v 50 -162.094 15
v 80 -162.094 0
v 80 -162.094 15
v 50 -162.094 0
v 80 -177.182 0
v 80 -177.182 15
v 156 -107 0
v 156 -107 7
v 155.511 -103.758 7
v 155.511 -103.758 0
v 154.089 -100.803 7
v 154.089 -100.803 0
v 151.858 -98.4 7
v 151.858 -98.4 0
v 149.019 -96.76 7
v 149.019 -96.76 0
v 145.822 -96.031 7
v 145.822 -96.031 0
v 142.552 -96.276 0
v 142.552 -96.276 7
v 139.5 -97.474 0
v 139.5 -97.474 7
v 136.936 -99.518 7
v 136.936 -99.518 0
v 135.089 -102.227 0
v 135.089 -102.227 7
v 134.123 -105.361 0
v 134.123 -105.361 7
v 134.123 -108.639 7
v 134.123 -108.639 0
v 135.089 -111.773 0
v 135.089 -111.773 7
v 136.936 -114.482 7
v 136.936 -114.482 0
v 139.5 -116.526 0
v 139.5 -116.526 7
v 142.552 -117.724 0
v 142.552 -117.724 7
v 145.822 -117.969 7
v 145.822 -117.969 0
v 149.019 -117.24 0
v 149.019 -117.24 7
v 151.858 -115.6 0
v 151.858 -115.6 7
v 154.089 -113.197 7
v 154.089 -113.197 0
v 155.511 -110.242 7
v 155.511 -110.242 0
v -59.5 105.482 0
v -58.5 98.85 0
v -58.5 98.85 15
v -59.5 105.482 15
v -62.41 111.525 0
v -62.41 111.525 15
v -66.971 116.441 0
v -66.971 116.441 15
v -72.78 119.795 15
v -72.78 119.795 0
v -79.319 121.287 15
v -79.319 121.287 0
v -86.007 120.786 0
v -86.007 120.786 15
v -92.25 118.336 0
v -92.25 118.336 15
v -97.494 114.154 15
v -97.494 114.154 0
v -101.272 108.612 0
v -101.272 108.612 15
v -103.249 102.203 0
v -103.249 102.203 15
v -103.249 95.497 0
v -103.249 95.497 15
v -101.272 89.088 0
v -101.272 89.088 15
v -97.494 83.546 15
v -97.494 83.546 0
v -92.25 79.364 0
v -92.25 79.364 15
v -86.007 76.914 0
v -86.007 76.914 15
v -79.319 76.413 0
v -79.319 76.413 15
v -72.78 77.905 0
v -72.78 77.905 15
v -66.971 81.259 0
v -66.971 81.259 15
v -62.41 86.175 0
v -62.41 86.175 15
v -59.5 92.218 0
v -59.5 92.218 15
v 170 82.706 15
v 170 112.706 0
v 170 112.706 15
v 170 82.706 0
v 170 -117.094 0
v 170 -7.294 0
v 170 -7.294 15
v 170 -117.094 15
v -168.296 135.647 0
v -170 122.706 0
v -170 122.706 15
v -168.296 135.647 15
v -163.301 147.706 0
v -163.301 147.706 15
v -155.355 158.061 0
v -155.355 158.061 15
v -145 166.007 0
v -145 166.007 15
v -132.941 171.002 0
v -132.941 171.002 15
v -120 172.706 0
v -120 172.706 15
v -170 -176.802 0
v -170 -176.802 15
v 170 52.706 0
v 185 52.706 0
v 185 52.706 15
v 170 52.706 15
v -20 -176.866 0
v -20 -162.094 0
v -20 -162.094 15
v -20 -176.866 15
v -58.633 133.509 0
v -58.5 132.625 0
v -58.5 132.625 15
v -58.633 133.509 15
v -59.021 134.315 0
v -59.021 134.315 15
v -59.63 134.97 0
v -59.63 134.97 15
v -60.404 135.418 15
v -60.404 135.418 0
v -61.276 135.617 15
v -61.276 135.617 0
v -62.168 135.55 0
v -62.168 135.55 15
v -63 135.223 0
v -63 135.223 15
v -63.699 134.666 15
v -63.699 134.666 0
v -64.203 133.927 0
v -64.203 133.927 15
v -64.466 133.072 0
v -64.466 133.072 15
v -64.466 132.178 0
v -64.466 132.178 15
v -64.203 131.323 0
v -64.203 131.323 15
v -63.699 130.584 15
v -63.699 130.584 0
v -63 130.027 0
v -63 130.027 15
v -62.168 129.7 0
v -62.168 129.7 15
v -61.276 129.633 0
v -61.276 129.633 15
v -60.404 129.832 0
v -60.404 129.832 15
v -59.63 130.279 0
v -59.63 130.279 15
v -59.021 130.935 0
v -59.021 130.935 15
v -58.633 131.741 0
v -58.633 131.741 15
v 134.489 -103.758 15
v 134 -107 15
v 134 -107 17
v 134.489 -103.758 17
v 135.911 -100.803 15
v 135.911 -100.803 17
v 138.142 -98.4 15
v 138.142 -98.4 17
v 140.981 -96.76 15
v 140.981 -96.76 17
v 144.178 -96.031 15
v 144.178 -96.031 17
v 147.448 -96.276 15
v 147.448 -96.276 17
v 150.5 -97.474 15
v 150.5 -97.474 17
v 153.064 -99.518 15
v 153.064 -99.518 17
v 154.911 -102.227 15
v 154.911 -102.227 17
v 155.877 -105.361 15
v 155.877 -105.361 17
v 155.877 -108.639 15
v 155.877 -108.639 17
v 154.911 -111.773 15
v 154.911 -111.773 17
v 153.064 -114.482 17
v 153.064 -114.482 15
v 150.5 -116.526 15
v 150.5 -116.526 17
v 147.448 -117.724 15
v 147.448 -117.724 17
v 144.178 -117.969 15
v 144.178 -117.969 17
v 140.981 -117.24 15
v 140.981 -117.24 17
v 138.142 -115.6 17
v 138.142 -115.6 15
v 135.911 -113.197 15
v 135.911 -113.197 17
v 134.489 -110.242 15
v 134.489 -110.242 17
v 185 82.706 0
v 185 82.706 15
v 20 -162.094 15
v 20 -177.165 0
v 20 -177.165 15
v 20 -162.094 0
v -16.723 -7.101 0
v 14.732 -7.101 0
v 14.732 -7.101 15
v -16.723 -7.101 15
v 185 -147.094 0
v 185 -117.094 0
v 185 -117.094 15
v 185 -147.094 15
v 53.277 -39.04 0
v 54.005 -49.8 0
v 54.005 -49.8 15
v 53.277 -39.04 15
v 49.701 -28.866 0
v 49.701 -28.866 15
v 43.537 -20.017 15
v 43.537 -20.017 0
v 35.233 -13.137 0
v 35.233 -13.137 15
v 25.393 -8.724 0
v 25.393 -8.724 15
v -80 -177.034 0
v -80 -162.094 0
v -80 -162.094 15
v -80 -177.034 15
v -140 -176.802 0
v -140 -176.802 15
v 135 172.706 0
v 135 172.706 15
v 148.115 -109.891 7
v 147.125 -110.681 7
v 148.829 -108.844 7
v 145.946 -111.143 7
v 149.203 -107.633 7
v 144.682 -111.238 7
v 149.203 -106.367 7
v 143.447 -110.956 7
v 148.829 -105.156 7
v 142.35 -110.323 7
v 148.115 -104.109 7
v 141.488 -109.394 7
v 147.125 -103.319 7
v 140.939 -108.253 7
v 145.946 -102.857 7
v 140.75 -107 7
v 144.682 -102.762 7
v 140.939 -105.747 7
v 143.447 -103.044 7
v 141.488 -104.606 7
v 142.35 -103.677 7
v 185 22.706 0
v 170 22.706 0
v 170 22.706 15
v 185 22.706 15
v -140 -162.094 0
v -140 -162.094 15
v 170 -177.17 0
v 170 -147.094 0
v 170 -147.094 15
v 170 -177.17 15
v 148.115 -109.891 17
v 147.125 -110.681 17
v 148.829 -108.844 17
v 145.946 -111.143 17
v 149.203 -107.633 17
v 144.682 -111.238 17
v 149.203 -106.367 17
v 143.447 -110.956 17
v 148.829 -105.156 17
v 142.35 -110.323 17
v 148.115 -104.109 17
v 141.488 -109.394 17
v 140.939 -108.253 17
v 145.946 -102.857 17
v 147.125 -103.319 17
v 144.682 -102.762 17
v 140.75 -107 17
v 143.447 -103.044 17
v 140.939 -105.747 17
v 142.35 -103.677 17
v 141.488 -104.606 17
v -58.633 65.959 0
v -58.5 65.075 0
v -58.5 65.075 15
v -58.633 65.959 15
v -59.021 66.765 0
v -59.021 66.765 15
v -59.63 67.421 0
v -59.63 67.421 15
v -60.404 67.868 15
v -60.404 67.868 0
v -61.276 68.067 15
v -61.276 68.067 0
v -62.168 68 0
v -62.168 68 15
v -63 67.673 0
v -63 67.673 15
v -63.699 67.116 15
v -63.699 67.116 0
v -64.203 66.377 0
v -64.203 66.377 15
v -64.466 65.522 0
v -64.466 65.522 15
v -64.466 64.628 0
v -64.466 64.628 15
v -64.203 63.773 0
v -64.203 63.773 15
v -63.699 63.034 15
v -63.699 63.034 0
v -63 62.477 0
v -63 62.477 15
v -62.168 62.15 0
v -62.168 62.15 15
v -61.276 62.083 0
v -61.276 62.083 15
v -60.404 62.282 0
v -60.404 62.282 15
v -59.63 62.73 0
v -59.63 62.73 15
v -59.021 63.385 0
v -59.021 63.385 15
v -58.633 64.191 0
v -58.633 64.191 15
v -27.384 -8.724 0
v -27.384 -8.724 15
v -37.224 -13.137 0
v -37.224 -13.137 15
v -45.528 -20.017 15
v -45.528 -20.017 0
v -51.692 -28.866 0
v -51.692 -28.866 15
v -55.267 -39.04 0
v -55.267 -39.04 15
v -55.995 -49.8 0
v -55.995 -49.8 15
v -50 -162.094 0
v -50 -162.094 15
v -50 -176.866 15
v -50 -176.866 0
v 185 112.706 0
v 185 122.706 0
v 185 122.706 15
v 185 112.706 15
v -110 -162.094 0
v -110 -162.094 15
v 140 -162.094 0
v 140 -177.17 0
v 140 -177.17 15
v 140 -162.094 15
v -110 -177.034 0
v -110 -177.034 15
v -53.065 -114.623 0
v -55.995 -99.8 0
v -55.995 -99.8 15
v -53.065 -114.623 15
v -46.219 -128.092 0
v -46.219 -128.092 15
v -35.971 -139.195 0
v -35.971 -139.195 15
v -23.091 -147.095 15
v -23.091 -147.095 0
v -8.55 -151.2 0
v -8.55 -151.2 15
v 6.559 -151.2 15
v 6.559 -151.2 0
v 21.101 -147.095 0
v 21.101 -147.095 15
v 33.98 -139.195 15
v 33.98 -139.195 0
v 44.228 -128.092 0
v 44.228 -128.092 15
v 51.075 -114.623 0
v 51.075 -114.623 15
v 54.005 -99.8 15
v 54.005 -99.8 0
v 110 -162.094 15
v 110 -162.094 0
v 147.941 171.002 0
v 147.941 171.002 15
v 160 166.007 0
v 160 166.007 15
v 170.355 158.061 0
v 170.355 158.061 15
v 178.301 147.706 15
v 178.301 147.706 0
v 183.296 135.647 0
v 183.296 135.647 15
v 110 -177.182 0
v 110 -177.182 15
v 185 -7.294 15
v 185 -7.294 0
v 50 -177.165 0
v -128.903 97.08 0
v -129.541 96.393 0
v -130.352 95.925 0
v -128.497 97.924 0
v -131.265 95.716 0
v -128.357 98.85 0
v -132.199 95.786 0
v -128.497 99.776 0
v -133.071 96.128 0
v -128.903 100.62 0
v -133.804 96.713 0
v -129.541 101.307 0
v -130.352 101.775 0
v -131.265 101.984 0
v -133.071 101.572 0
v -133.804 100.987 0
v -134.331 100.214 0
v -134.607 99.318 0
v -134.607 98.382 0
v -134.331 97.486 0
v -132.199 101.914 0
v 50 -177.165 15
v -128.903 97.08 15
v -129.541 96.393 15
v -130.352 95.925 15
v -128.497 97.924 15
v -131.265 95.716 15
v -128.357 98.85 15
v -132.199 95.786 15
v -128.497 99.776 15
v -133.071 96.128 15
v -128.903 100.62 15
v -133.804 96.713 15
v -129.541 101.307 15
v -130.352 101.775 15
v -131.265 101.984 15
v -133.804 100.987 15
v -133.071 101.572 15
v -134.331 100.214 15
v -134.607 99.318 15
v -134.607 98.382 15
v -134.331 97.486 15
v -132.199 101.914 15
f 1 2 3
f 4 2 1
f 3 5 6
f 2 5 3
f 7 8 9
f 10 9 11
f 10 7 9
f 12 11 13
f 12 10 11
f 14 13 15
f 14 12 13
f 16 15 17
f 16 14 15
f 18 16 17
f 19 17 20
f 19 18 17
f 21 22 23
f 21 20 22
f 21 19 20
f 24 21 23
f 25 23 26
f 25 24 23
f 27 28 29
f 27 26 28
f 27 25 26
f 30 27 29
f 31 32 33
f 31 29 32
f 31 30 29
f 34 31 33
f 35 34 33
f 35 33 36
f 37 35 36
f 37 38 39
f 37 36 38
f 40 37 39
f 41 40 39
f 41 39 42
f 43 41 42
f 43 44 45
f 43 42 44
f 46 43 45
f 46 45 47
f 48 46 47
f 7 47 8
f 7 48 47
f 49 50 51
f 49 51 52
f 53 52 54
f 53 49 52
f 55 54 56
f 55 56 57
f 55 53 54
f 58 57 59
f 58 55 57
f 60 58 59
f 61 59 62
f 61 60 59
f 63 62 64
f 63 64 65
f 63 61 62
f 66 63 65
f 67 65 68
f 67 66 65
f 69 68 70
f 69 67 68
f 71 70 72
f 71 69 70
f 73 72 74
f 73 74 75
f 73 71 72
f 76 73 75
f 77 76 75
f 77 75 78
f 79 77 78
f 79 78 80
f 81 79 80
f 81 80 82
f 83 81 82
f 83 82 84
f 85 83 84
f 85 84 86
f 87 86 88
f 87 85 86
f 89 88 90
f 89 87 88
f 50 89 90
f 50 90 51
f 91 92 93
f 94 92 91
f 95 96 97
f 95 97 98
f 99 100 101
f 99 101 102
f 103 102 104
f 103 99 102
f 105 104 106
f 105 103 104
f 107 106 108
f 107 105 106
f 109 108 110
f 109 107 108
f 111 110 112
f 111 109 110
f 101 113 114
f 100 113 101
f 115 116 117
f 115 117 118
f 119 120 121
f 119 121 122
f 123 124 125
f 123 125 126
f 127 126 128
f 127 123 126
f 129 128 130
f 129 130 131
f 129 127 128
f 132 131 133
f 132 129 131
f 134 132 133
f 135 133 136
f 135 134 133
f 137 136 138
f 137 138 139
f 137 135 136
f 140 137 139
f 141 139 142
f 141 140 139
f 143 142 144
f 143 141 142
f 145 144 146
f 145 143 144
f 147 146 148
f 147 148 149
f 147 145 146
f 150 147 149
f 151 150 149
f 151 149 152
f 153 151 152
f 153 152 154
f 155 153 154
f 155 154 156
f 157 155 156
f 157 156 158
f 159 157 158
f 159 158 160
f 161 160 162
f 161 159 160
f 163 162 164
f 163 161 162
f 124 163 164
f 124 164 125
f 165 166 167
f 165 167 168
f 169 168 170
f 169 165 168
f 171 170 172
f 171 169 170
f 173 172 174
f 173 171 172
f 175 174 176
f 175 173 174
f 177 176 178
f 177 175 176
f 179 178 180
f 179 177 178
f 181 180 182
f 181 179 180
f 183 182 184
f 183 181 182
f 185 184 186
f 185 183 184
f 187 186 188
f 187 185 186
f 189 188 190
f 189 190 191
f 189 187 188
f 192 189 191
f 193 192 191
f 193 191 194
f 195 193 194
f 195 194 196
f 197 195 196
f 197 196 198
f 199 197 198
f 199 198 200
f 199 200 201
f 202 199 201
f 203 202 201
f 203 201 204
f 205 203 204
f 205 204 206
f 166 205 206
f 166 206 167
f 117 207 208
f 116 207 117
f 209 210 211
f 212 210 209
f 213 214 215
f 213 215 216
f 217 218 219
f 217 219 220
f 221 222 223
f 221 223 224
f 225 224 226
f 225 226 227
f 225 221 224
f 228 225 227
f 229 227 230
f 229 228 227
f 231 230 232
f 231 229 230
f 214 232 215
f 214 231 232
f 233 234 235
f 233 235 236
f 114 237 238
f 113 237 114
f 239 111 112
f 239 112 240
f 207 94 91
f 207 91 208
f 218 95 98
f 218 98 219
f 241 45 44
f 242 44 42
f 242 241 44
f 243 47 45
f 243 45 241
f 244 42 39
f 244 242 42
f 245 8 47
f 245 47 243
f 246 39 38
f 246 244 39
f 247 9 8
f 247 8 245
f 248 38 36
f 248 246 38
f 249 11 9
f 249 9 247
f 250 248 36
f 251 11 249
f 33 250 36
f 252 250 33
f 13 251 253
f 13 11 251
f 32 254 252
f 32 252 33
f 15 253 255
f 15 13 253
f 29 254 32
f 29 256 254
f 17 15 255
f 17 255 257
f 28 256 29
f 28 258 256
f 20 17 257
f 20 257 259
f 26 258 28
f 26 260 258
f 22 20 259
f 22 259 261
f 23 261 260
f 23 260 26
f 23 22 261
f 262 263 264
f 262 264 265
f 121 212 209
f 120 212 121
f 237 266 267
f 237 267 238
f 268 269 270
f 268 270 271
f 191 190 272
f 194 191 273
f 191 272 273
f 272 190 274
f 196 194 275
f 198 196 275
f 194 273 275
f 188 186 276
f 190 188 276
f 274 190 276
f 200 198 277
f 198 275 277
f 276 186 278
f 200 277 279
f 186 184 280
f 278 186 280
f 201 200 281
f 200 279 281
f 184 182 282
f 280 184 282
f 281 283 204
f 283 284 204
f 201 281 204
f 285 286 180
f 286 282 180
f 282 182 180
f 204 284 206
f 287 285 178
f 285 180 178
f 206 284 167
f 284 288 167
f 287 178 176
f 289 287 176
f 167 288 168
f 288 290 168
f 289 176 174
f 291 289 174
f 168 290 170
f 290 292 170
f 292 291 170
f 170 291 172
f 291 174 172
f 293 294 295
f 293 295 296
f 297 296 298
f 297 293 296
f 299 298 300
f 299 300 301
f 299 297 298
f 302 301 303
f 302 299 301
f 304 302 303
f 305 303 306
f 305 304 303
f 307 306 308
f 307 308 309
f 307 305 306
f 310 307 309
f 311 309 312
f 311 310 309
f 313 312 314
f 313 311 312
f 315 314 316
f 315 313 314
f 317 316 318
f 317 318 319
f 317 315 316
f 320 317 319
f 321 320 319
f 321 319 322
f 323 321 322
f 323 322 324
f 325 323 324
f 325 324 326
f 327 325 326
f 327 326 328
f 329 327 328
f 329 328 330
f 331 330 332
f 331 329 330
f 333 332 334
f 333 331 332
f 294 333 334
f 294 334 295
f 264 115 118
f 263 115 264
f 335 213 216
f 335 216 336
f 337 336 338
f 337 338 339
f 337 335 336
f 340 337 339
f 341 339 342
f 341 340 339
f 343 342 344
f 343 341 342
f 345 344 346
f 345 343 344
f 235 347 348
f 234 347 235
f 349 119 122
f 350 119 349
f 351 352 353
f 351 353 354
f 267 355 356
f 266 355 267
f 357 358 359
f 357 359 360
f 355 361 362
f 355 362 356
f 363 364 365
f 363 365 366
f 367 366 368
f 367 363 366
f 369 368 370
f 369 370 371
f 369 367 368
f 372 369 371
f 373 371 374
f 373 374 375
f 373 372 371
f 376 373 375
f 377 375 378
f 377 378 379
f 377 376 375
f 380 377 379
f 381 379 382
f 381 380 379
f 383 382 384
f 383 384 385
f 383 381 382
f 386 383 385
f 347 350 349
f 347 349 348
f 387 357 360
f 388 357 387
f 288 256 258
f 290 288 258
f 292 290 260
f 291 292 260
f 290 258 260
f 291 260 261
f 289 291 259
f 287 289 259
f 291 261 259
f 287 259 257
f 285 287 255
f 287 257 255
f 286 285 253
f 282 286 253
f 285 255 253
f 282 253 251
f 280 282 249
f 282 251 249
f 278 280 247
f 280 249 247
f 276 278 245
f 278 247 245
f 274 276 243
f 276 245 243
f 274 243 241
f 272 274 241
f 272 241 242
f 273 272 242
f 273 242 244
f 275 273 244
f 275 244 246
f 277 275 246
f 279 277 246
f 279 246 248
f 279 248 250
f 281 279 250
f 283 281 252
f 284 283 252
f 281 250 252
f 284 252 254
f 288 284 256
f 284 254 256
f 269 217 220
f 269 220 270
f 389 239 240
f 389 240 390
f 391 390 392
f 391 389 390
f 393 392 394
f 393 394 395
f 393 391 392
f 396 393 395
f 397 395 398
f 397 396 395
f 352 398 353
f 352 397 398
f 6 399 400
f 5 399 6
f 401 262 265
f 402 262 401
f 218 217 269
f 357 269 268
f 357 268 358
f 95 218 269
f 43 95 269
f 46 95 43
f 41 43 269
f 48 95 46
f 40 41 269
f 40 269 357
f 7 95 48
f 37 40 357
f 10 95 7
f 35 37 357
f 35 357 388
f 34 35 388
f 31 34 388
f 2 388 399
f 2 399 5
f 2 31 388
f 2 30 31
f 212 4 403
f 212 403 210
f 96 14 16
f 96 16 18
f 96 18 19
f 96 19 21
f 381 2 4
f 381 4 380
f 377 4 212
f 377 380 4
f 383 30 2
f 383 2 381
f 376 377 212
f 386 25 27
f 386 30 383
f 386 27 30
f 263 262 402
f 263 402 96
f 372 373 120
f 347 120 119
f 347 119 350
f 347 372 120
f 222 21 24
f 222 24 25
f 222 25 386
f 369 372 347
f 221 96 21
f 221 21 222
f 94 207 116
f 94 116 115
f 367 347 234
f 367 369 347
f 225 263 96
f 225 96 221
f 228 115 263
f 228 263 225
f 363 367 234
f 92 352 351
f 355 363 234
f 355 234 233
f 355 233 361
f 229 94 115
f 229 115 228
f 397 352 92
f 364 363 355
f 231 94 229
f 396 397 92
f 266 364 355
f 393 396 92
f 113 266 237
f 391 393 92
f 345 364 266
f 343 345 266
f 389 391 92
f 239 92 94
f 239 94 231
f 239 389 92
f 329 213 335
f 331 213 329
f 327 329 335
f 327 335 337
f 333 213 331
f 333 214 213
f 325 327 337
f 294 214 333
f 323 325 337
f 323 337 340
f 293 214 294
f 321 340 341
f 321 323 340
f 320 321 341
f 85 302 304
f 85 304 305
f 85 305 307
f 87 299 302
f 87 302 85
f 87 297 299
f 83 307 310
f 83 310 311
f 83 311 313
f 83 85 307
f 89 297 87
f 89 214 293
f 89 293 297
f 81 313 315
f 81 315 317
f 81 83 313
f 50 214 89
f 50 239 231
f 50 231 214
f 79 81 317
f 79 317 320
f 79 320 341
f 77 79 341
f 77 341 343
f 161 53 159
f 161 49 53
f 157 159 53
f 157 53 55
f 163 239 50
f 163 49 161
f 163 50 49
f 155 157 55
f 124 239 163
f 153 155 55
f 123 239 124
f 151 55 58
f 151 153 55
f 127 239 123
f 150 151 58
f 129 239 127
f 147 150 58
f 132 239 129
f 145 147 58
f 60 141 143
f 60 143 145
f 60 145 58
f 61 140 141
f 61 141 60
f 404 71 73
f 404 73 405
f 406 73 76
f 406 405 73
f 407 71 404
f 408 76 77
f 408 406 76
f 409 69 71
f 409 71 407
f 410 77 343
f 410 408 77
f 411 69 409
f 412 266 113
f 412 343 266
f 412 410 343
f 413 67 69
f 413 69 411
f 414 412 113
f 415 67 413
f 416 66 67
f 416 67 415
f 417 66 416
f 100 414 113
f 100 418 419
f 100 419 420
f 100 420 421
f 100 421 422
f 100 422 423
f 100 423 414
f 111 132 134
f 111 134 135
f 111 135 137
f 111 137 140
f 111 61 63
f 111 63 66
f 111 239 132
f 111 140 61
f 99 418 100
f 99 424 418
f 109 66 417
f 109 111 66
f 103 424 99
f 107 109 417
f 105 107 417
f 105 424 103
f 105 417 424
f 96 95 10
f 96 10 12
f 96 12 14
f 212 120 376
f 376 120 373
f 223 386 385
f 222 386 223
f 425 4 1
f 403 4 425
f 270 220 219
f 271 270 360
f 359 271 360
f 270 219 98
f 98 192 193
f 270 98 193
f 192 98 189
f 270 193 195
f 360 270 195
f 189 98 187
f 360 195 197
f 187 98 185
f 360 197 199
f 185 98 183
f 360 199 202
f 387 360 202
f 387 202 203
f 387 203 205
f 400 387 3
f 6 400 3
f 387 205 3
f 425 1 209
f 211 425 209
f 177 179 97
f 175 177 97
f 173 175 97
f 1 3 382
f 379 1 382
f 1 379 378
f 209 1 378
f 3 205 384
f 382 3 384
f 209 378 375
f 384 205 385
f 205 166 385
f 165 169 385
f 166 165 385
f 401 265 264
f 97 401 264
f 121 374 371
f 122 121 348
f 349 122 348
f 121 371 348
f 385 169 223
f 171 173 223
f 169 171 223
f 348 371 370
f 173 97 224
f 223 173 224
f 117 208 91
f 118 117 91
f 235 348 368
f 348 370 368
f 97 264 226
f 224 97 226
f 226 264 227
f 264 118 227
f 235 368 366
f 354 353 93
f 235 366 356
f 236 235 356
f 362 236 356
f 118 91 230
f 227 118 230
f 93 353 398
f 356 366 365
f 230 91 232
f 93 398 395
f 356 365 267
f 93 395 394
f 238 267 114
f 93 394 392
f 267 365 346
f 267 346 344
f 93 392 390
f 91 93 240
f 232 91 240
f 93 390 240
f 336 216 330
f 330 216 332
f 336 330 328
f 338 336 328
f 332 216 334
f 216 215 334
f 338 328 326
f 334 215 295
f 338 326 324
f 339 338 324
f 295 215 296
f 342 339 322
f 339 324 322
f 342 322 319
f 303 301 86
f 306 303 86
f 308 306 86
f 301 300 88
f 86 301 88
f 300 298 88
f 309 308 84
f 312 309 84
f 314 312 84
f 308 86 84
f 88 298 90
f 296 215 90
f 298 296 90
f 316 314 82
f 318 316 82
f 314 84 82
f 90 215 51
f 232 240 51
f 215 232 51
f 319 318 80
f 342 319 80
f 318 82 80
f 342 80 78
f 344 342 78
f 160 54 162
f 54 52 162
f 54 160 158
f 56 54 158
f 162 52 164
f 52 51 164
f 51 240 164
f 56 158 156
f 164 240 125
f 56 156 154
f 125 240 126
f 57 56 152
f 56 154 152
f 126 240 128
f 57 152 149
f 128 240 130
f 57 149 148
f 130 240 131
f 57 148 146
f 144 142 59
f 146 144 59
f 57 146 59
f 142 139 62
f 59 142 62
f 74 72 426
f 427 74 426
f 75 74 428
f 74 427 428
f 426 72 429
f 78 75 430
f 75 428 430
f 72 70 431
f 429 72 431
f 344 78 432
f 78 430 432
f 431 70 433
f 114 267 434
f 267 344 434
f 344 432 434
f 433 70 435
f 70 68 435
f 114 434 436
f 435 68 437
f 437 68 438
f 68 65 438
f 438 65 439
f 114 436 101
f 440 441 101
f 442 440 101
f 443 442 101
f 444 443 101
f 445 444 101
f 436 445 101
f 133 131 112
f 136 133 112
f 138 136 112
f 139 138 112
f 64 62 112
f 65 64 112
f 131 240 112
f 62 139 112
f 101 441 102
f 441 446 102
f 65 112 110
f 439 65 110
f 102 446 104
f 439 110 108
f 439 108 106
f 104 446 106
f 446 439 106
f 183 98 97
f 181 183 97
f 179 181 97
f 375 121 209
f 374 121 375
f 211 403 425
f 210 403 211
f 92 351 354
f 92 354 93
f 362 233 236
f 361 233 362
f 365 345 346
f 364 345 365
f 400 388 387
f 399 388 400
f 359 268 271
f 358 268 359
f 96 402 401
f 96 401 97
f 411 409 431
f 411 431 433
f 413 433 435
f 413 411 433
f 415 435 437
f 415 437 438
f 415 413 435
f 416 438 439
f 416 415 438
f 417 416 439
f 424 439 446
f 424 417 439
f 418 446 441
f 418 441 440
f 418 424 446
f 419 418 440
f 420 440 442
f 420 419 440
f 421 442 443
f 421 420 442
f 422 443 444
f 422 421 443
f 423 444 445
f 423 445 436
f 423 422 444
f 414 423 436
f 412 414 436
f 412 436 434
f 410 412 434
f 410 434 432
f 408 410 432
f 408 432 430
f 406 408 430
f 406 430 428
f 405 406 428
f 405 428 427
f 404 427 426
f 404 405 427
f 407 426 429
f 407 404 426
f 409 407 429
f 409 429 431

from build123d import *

# Parameters (mm, degrees)
SKETCH1_R           = 11
SKETCH1_R_2         = 3.142556432
SKETCH1_R_3         = 22.5
SKETCH1_R_4         = 3
BOSS_EXTRUDE1_DEPTH = 15
BOSS_EXTRUDE2_START = 10
SKETCH3_R           = 11
SKETCH3_R_2         = 4.25
BOSS_EXTRUDE2_DEPTH = 10


with BuildPart() as part:
    # Sketch1 → Boss-Extrude1 (new body)
    with BuildSketch(Plane.XY):
        with BuildLine():
            Line((-120, 172.705707432), (135, 172.705707432))
            ThreePointArc((135, 172.705707432), (170.355339059, 158.061046491), (185, 122.705707432))
            Line((185, 122.705707432), (185, 112.705707432))
            Line((185, 112.705707432), (170, 112.705707432))
            Line((170, 112.705707432), (170, 82.705707432))
            Line((170, 82.705707432), (185, 82.705707432))
            Line((185, 82.705707432), (185, 52.705707432))
            Line((185, 52.705707432), (170, 52.705707432))
            Line((170, 52.705707432), (170, 22.705707432))
            Line((170, 22.705707432), (185, 22.705707432))
            Line((185, 22.705707432), (185, -7.294292568))
            Line((185, -7.294292568), (170, -7.294292568))
            Line((170, -7.294292568), (170, -117.094321696))
            Line((170, -117.094321696), (185, -117.094321696))
            Line((185, -117.094321696), (185, -147.094321696))
            Line((185, -147.094321696), (170, -147.094321696))
            Line((170, -147.094321696), (170, -162.094292568))
            Line((170, -162.094292568), (170, -177.170123414))
            Line((170, -177.170123414), (140, -177.170123414))
            Line((140, -177.170123414), (140, -162.094292568))
            Line((140, -162.094292568), (110, -162.094292568))
            Line((110, -162.094292568), (110, -177.182197899))
            Line((110, -177.182197899), (80, -177.182197899))
            Line((80, -177.182197899), (80, -162.094292568))
            Line((80, -162.094292568), (50, -162.094292568))
            Line((50, -162.094292568), (50, -177.165057848))
            Line((50, -177.165057848), (20, -177.165057848))
            Line((20, -177.165057848), (20, -162.094292568))
            Line((20, -162.094292568), (-20, -162.094292568))
            Line((-20, -162.094292568), (-20, -176.865618337))
            Line((-20, -176.865618337), (-50, -176.865618337))
            Line((-50, -176.865618337), (-50, -162.094292568))
            Line((-50, -162.094292568), (-80, -162.094292568))
            Line((-80, -162.094292568), (-80, -177.034188853))
            Line((-80, -177.034188853), (-110, -177.034188853))
            Line((-110, -177.034188853), (-110, -162.094292568))
            Line((-110, -162.094292568), (-140, -162.094292568))
            Line((-140, -162.094292568), (-140, -176.801614054))
            Line((-140, -176.801614054), (-170, -176.801614054))
            Line((-170, -176.801614054), (-170, -167.294292568))
            Line((-170, -167.294292568), (-170, 122.705707432))
            ThreePointArc((-170, 122.705707432), (-155.355339059, 158.061046491), (-120, 172.705707432))
        make_face()
        with Locations((145, -107)):
            Circle(SKETCH1_R, mode=Mode.SUBTRACT)
        with Locations((-131.5, 98.85)):
            Circle(SKETCH1_R_2, mode=Mode.SUBTRACT)
        with Locations((-81, 98.85)):
            Circle(SKETCH1_R_3, mode=Mode.SUBTRACT)
        with Locations((-61.5, 65.075009252)):
            Circle(SKETCH1_R_4, mode=Mode.SUBTRACT)
        with Locations((-61.5, 132.624990748)):
            Circle(SKETCH1_R_4, mode=Mode.SUBTRACT)
        with BuildLine():
            Line((-55.995398281, -49.8), (-55.995398281, -99.8))
            ThreePointArc((-55.995398281, -99.8), (-0.995398281, -151.720675316), (54.004601719, -99.8))
            Line((54.004601719, -99.8), (54.004601719, -49.8))
            ThreePointArc((54.004601719, -49.8), (43.536944591, -20.017496175), (14.731892041, -7.100905005))
            Line((14.731892041, -7.100905005), (-16.722688603, -7.100905005))
            ThreePointArc((-16.722688603, -7.100905005), (-45.527741152, -20.017496175), (-55.995398281, -49.8))
        make_face(mode=Mode.SUBTRACT)
    extrude(amount=BOSS_EXTRUDE1_DEPTH)

    # Sketch3 → Boss-Extrude2 (add)
    with BuildSketch(Plane(origin=(0, 0, 17), x_dir=(-1, 0, 0), z_dir=(0, 0, -1)).offset(BOSS_EXTRUDE2_START)):
        with Locations((-145, -107)):
            Circle(SKETCH3_R)
        with Locations((-145, -107)):
            Circle(SKETCH3_R_2, mode=Mode.SUBTRACT)
    extrude(amount=-BOSS_EXTRUDE2_DEPTH)


solid = part.part
